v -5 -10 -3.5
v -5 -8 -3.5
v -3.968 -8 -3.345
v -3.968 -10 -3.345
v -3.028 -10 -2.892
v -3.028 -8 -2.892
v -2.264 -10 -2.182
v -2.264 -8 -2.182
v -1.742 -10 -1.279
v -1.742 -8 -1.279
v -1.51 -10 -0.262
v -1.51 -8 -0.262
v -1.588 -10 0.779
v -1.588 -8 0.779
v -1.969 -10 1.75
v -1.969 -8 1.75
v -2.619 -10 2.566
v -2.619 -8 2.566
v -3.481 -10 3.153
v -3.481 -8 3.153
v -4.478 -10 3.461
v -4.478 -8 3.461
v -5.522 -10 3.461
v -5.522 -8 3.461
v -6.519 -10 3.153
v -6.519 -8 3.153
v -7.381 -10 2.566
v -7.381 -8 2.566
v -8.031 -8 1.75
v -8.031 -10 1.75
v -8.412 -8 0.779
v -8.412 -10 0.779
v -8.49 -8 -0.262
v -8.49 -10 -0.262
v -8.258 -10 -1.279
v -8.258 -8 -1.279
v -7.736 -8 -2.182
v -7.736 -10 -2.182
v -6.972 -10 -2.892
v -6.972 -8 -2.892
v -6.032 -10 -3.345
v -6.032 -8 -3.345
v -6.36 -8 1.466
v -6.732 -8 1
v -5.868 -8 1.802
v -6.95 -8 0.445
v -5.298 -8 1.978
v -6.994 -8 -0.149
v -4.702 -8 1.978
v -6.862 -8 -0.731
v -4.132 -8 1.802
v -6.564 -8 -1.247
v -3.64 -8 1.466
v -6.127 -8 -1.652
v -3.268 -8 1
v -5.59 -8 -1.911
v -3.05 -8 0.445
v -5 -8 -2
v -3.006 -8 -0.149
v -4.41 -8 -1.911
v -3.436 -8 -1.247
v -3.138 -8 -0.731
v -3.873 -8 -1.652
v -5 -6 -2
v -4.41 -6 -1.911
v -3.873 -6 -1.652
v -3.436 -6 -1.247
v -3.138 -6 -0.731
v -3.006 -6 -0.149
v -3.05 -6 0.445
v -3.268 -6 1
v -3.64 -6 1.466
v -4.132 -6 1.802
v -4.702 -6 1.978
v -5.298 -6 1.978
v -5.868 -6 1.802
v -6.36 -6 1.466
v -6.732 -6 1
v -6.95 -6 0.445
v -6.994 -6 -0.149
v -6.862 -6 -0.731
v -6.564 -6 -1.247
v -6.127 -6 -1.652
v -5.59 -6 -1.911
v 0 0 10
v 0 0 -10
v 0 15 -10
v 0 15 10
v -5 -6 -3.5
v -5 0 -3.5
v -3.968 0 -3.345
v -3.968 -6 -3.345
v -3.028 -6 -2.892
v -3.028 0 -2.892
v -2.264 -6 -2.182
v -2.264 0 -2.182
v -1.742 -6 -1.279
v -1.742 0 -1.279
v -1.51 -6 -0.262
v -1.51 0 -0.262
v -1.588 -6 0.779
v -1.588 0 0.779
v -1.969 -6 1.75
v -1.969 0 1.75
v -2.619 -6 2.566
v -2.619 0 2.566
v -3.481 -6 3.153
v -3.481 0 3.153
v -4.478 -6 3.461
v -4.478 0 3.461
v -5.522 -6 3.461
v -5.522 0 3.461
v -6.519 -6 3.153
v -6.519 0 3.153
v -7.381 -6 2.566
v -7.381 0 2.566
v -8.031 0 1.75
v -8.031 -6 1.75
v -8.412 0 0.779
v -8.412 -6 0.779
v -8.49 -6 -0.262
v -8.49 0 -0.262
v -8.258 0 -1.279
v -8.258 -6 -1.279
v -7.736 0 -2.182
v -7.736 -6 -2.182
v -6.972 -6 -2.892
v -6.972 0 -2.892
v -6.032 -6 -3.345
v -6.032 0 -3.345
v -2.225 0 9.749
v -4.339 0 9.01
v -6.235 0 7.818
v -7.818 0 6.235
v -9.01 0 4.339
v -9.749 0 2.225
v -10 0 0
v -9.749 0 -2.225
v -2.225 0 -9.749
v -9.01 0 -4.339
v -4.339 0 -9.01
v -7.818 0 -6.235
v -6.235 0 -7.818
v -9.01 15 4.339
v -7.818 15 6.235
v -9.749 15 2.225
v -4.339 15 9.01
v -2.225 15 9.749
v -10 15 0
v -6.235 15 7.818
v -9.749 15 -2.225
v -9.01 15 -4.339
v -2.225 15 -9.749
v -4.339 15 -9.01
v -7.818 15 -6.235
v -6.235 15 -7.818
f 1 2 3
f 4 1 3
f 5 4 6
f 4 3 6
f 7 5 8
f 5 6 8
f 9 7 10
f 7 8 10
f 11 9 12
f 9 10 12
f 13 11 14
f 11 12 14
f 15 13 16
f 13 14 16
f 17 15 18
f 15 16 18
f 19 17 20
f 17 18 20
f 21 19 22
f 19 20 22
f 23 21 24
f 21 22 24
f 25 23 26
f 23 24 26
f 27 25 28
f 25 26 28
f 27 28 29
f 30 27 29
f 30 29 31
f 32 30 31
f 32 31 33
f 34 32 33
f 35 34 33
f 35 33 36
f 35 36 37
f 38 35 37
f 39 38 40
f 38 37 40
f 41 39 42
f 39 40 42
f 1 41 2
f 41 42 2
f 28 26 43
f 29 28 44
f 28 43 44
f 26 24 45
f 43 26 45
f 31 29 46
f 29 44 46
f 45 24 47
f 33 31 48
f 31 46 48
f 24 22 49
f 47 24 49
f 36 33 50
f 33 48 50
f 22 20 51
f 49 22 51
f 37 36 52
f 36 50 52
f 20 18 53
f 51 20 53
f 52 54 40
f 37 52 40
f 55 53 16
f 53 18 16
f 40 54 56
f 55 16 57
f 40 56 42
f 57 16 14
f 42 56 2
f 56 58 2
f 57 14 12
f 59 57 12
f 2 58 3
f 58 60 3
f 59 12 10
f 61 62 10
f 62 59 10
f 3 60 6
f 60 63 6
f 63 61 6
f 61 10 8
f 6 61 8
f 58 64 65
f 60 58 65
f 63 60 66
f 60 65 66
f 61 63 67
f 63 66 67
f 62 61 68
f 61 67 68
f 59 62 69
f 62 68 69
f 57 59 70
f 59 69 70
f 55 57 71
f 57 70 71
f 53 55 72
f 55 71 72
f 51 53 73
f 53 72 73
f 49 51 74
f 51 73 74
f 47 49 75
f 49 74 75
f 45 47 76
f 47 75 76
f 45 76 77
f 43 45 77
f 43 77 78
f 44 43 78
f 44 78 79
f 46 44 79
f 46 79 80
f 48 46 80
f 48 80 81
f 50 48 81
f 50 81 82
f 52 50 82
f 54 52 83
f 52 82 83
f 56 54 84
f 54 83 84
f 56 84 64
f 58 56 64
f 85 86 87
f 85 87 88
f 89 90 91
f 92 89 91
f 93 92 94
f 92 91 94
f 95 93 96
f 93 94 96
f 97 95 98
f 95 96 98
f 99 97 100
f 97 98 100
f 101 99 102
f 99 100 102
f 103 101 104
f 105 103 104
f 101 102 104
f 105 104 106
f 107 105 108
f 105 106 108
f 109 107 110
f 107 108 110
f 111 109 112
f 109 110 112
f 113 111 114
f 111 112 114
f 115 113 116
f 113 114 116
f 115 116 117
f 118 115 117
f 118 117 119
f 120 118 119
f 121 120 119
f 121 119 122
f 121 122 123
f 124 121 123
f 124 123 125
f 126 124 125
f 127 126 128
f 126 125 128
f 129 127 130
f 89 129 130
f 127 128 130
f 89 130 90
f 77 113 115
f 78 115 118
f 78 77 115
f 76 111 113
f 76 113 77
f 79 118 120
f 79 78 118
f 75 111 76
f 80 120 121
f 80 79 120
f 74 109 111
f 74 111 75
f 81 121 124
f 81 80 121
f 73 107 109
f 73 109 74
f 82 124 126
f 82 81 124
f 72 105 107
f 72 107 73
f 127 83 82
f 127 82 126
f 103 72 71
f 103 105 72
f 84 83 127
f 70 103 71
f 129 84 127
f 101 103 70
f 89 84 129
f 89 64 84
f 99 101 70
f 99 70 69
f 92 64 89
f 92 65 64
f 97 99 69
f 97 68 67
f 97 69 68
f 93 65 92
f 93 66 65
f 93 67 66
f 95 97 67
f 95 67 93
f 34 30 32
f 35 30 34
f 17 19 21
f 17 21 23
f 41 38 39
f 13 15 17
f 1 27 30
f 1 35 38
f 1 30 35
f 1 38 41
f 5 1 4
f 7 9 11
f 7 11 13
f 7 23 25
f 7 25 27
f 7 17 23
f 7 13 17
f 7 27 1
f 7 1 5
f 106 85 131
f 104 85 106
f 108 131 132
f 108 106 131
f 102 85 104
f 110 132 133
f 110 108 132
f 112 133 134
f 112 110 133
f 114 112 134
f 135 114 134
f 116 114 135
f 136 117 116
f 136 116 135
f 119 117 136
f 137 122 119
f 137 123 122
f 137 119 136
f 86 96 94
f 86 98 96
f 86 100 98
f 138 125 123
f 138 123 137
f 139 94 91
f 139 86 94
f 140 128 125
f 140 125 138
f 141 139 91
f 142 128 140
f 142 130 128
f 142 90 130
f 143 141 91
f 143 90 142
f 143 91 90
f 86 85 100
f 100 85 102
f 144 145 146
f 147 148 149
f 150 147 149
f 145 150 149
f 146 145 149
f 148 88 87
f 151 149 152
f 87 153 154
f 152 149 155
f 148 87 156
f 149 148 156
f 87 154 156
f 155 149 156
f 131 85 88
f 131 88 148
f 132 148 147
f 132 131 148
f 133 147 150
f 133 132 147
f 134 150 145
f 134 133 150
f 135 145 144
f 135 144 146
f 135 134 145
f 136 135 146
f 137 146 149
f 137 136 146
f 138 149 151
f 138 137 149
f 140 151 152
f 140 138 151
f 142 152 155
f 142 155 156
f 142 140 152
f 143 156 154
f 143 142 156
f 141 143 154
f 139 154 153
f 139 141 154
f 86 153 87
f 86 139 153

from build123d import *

# Parameters (mm, degrees)
SALIENTE_EXTRUIR1_DEPTH = 15
CROQUIS3_R              = 3.5
SALIENTE_EXTRUIR2_DEPTH = 6
CROQUIS5_R              = 2
SALIENTE_EXTRUIR4_DEPTH = 2
CROQUIS7_R              = 3.5
SALIENTE_EXTRUIR5_DEPTH = 2


with BuildPart() as part:
    # Croquis2 → Saliente-Extruir1 (new body)
    with BuildSketch(Plane(origin=(0, 0, 0), x_dir=(1, 0, 0), z_dir=(0, 1, 0))):
        with BuildLine():
            Line((0, 10), (0, -10))
            ThreePointArc((0, -10), (-10, 0), (0, 10))
        make_face()
    extrude(amount=SALIENTE_EXTRUIR1_DEPTH)

    # Croquis3 → Saliente-Extruir2 (add)
    with BuildSketch(Plane.XZ):
        with Locations(Location((-5, 0, 0), (0, 0, 270))):
            Circle(CROQUIS3_R)
    extrude(amount=SALIENTE_EXTRUIR2_DEPTH)

    # Croquis5 → Saliente-Extruir4 (add)
    with BuildSketch(Plane.XZ.offset(6)):
        with Locations(Location((-5, 0, 0), (0, 0, 270))):
            Circle(CROQUIS5_R)
    extrude(amount=SALIENTE_EXTRUIR4_DEPTH)

    # Croquis7 → Saliente-Extruir5 (add)
    with BuildSketch(Plane.XZ.offset(8)):
        with Locations(Location((-5, 0, 0), (0, 0, 270))):
            Circle(CROQUIS7_R)
    extrude(amount=SALIENTE_EXTRUIR5_DEPTH)


solid = part.part
